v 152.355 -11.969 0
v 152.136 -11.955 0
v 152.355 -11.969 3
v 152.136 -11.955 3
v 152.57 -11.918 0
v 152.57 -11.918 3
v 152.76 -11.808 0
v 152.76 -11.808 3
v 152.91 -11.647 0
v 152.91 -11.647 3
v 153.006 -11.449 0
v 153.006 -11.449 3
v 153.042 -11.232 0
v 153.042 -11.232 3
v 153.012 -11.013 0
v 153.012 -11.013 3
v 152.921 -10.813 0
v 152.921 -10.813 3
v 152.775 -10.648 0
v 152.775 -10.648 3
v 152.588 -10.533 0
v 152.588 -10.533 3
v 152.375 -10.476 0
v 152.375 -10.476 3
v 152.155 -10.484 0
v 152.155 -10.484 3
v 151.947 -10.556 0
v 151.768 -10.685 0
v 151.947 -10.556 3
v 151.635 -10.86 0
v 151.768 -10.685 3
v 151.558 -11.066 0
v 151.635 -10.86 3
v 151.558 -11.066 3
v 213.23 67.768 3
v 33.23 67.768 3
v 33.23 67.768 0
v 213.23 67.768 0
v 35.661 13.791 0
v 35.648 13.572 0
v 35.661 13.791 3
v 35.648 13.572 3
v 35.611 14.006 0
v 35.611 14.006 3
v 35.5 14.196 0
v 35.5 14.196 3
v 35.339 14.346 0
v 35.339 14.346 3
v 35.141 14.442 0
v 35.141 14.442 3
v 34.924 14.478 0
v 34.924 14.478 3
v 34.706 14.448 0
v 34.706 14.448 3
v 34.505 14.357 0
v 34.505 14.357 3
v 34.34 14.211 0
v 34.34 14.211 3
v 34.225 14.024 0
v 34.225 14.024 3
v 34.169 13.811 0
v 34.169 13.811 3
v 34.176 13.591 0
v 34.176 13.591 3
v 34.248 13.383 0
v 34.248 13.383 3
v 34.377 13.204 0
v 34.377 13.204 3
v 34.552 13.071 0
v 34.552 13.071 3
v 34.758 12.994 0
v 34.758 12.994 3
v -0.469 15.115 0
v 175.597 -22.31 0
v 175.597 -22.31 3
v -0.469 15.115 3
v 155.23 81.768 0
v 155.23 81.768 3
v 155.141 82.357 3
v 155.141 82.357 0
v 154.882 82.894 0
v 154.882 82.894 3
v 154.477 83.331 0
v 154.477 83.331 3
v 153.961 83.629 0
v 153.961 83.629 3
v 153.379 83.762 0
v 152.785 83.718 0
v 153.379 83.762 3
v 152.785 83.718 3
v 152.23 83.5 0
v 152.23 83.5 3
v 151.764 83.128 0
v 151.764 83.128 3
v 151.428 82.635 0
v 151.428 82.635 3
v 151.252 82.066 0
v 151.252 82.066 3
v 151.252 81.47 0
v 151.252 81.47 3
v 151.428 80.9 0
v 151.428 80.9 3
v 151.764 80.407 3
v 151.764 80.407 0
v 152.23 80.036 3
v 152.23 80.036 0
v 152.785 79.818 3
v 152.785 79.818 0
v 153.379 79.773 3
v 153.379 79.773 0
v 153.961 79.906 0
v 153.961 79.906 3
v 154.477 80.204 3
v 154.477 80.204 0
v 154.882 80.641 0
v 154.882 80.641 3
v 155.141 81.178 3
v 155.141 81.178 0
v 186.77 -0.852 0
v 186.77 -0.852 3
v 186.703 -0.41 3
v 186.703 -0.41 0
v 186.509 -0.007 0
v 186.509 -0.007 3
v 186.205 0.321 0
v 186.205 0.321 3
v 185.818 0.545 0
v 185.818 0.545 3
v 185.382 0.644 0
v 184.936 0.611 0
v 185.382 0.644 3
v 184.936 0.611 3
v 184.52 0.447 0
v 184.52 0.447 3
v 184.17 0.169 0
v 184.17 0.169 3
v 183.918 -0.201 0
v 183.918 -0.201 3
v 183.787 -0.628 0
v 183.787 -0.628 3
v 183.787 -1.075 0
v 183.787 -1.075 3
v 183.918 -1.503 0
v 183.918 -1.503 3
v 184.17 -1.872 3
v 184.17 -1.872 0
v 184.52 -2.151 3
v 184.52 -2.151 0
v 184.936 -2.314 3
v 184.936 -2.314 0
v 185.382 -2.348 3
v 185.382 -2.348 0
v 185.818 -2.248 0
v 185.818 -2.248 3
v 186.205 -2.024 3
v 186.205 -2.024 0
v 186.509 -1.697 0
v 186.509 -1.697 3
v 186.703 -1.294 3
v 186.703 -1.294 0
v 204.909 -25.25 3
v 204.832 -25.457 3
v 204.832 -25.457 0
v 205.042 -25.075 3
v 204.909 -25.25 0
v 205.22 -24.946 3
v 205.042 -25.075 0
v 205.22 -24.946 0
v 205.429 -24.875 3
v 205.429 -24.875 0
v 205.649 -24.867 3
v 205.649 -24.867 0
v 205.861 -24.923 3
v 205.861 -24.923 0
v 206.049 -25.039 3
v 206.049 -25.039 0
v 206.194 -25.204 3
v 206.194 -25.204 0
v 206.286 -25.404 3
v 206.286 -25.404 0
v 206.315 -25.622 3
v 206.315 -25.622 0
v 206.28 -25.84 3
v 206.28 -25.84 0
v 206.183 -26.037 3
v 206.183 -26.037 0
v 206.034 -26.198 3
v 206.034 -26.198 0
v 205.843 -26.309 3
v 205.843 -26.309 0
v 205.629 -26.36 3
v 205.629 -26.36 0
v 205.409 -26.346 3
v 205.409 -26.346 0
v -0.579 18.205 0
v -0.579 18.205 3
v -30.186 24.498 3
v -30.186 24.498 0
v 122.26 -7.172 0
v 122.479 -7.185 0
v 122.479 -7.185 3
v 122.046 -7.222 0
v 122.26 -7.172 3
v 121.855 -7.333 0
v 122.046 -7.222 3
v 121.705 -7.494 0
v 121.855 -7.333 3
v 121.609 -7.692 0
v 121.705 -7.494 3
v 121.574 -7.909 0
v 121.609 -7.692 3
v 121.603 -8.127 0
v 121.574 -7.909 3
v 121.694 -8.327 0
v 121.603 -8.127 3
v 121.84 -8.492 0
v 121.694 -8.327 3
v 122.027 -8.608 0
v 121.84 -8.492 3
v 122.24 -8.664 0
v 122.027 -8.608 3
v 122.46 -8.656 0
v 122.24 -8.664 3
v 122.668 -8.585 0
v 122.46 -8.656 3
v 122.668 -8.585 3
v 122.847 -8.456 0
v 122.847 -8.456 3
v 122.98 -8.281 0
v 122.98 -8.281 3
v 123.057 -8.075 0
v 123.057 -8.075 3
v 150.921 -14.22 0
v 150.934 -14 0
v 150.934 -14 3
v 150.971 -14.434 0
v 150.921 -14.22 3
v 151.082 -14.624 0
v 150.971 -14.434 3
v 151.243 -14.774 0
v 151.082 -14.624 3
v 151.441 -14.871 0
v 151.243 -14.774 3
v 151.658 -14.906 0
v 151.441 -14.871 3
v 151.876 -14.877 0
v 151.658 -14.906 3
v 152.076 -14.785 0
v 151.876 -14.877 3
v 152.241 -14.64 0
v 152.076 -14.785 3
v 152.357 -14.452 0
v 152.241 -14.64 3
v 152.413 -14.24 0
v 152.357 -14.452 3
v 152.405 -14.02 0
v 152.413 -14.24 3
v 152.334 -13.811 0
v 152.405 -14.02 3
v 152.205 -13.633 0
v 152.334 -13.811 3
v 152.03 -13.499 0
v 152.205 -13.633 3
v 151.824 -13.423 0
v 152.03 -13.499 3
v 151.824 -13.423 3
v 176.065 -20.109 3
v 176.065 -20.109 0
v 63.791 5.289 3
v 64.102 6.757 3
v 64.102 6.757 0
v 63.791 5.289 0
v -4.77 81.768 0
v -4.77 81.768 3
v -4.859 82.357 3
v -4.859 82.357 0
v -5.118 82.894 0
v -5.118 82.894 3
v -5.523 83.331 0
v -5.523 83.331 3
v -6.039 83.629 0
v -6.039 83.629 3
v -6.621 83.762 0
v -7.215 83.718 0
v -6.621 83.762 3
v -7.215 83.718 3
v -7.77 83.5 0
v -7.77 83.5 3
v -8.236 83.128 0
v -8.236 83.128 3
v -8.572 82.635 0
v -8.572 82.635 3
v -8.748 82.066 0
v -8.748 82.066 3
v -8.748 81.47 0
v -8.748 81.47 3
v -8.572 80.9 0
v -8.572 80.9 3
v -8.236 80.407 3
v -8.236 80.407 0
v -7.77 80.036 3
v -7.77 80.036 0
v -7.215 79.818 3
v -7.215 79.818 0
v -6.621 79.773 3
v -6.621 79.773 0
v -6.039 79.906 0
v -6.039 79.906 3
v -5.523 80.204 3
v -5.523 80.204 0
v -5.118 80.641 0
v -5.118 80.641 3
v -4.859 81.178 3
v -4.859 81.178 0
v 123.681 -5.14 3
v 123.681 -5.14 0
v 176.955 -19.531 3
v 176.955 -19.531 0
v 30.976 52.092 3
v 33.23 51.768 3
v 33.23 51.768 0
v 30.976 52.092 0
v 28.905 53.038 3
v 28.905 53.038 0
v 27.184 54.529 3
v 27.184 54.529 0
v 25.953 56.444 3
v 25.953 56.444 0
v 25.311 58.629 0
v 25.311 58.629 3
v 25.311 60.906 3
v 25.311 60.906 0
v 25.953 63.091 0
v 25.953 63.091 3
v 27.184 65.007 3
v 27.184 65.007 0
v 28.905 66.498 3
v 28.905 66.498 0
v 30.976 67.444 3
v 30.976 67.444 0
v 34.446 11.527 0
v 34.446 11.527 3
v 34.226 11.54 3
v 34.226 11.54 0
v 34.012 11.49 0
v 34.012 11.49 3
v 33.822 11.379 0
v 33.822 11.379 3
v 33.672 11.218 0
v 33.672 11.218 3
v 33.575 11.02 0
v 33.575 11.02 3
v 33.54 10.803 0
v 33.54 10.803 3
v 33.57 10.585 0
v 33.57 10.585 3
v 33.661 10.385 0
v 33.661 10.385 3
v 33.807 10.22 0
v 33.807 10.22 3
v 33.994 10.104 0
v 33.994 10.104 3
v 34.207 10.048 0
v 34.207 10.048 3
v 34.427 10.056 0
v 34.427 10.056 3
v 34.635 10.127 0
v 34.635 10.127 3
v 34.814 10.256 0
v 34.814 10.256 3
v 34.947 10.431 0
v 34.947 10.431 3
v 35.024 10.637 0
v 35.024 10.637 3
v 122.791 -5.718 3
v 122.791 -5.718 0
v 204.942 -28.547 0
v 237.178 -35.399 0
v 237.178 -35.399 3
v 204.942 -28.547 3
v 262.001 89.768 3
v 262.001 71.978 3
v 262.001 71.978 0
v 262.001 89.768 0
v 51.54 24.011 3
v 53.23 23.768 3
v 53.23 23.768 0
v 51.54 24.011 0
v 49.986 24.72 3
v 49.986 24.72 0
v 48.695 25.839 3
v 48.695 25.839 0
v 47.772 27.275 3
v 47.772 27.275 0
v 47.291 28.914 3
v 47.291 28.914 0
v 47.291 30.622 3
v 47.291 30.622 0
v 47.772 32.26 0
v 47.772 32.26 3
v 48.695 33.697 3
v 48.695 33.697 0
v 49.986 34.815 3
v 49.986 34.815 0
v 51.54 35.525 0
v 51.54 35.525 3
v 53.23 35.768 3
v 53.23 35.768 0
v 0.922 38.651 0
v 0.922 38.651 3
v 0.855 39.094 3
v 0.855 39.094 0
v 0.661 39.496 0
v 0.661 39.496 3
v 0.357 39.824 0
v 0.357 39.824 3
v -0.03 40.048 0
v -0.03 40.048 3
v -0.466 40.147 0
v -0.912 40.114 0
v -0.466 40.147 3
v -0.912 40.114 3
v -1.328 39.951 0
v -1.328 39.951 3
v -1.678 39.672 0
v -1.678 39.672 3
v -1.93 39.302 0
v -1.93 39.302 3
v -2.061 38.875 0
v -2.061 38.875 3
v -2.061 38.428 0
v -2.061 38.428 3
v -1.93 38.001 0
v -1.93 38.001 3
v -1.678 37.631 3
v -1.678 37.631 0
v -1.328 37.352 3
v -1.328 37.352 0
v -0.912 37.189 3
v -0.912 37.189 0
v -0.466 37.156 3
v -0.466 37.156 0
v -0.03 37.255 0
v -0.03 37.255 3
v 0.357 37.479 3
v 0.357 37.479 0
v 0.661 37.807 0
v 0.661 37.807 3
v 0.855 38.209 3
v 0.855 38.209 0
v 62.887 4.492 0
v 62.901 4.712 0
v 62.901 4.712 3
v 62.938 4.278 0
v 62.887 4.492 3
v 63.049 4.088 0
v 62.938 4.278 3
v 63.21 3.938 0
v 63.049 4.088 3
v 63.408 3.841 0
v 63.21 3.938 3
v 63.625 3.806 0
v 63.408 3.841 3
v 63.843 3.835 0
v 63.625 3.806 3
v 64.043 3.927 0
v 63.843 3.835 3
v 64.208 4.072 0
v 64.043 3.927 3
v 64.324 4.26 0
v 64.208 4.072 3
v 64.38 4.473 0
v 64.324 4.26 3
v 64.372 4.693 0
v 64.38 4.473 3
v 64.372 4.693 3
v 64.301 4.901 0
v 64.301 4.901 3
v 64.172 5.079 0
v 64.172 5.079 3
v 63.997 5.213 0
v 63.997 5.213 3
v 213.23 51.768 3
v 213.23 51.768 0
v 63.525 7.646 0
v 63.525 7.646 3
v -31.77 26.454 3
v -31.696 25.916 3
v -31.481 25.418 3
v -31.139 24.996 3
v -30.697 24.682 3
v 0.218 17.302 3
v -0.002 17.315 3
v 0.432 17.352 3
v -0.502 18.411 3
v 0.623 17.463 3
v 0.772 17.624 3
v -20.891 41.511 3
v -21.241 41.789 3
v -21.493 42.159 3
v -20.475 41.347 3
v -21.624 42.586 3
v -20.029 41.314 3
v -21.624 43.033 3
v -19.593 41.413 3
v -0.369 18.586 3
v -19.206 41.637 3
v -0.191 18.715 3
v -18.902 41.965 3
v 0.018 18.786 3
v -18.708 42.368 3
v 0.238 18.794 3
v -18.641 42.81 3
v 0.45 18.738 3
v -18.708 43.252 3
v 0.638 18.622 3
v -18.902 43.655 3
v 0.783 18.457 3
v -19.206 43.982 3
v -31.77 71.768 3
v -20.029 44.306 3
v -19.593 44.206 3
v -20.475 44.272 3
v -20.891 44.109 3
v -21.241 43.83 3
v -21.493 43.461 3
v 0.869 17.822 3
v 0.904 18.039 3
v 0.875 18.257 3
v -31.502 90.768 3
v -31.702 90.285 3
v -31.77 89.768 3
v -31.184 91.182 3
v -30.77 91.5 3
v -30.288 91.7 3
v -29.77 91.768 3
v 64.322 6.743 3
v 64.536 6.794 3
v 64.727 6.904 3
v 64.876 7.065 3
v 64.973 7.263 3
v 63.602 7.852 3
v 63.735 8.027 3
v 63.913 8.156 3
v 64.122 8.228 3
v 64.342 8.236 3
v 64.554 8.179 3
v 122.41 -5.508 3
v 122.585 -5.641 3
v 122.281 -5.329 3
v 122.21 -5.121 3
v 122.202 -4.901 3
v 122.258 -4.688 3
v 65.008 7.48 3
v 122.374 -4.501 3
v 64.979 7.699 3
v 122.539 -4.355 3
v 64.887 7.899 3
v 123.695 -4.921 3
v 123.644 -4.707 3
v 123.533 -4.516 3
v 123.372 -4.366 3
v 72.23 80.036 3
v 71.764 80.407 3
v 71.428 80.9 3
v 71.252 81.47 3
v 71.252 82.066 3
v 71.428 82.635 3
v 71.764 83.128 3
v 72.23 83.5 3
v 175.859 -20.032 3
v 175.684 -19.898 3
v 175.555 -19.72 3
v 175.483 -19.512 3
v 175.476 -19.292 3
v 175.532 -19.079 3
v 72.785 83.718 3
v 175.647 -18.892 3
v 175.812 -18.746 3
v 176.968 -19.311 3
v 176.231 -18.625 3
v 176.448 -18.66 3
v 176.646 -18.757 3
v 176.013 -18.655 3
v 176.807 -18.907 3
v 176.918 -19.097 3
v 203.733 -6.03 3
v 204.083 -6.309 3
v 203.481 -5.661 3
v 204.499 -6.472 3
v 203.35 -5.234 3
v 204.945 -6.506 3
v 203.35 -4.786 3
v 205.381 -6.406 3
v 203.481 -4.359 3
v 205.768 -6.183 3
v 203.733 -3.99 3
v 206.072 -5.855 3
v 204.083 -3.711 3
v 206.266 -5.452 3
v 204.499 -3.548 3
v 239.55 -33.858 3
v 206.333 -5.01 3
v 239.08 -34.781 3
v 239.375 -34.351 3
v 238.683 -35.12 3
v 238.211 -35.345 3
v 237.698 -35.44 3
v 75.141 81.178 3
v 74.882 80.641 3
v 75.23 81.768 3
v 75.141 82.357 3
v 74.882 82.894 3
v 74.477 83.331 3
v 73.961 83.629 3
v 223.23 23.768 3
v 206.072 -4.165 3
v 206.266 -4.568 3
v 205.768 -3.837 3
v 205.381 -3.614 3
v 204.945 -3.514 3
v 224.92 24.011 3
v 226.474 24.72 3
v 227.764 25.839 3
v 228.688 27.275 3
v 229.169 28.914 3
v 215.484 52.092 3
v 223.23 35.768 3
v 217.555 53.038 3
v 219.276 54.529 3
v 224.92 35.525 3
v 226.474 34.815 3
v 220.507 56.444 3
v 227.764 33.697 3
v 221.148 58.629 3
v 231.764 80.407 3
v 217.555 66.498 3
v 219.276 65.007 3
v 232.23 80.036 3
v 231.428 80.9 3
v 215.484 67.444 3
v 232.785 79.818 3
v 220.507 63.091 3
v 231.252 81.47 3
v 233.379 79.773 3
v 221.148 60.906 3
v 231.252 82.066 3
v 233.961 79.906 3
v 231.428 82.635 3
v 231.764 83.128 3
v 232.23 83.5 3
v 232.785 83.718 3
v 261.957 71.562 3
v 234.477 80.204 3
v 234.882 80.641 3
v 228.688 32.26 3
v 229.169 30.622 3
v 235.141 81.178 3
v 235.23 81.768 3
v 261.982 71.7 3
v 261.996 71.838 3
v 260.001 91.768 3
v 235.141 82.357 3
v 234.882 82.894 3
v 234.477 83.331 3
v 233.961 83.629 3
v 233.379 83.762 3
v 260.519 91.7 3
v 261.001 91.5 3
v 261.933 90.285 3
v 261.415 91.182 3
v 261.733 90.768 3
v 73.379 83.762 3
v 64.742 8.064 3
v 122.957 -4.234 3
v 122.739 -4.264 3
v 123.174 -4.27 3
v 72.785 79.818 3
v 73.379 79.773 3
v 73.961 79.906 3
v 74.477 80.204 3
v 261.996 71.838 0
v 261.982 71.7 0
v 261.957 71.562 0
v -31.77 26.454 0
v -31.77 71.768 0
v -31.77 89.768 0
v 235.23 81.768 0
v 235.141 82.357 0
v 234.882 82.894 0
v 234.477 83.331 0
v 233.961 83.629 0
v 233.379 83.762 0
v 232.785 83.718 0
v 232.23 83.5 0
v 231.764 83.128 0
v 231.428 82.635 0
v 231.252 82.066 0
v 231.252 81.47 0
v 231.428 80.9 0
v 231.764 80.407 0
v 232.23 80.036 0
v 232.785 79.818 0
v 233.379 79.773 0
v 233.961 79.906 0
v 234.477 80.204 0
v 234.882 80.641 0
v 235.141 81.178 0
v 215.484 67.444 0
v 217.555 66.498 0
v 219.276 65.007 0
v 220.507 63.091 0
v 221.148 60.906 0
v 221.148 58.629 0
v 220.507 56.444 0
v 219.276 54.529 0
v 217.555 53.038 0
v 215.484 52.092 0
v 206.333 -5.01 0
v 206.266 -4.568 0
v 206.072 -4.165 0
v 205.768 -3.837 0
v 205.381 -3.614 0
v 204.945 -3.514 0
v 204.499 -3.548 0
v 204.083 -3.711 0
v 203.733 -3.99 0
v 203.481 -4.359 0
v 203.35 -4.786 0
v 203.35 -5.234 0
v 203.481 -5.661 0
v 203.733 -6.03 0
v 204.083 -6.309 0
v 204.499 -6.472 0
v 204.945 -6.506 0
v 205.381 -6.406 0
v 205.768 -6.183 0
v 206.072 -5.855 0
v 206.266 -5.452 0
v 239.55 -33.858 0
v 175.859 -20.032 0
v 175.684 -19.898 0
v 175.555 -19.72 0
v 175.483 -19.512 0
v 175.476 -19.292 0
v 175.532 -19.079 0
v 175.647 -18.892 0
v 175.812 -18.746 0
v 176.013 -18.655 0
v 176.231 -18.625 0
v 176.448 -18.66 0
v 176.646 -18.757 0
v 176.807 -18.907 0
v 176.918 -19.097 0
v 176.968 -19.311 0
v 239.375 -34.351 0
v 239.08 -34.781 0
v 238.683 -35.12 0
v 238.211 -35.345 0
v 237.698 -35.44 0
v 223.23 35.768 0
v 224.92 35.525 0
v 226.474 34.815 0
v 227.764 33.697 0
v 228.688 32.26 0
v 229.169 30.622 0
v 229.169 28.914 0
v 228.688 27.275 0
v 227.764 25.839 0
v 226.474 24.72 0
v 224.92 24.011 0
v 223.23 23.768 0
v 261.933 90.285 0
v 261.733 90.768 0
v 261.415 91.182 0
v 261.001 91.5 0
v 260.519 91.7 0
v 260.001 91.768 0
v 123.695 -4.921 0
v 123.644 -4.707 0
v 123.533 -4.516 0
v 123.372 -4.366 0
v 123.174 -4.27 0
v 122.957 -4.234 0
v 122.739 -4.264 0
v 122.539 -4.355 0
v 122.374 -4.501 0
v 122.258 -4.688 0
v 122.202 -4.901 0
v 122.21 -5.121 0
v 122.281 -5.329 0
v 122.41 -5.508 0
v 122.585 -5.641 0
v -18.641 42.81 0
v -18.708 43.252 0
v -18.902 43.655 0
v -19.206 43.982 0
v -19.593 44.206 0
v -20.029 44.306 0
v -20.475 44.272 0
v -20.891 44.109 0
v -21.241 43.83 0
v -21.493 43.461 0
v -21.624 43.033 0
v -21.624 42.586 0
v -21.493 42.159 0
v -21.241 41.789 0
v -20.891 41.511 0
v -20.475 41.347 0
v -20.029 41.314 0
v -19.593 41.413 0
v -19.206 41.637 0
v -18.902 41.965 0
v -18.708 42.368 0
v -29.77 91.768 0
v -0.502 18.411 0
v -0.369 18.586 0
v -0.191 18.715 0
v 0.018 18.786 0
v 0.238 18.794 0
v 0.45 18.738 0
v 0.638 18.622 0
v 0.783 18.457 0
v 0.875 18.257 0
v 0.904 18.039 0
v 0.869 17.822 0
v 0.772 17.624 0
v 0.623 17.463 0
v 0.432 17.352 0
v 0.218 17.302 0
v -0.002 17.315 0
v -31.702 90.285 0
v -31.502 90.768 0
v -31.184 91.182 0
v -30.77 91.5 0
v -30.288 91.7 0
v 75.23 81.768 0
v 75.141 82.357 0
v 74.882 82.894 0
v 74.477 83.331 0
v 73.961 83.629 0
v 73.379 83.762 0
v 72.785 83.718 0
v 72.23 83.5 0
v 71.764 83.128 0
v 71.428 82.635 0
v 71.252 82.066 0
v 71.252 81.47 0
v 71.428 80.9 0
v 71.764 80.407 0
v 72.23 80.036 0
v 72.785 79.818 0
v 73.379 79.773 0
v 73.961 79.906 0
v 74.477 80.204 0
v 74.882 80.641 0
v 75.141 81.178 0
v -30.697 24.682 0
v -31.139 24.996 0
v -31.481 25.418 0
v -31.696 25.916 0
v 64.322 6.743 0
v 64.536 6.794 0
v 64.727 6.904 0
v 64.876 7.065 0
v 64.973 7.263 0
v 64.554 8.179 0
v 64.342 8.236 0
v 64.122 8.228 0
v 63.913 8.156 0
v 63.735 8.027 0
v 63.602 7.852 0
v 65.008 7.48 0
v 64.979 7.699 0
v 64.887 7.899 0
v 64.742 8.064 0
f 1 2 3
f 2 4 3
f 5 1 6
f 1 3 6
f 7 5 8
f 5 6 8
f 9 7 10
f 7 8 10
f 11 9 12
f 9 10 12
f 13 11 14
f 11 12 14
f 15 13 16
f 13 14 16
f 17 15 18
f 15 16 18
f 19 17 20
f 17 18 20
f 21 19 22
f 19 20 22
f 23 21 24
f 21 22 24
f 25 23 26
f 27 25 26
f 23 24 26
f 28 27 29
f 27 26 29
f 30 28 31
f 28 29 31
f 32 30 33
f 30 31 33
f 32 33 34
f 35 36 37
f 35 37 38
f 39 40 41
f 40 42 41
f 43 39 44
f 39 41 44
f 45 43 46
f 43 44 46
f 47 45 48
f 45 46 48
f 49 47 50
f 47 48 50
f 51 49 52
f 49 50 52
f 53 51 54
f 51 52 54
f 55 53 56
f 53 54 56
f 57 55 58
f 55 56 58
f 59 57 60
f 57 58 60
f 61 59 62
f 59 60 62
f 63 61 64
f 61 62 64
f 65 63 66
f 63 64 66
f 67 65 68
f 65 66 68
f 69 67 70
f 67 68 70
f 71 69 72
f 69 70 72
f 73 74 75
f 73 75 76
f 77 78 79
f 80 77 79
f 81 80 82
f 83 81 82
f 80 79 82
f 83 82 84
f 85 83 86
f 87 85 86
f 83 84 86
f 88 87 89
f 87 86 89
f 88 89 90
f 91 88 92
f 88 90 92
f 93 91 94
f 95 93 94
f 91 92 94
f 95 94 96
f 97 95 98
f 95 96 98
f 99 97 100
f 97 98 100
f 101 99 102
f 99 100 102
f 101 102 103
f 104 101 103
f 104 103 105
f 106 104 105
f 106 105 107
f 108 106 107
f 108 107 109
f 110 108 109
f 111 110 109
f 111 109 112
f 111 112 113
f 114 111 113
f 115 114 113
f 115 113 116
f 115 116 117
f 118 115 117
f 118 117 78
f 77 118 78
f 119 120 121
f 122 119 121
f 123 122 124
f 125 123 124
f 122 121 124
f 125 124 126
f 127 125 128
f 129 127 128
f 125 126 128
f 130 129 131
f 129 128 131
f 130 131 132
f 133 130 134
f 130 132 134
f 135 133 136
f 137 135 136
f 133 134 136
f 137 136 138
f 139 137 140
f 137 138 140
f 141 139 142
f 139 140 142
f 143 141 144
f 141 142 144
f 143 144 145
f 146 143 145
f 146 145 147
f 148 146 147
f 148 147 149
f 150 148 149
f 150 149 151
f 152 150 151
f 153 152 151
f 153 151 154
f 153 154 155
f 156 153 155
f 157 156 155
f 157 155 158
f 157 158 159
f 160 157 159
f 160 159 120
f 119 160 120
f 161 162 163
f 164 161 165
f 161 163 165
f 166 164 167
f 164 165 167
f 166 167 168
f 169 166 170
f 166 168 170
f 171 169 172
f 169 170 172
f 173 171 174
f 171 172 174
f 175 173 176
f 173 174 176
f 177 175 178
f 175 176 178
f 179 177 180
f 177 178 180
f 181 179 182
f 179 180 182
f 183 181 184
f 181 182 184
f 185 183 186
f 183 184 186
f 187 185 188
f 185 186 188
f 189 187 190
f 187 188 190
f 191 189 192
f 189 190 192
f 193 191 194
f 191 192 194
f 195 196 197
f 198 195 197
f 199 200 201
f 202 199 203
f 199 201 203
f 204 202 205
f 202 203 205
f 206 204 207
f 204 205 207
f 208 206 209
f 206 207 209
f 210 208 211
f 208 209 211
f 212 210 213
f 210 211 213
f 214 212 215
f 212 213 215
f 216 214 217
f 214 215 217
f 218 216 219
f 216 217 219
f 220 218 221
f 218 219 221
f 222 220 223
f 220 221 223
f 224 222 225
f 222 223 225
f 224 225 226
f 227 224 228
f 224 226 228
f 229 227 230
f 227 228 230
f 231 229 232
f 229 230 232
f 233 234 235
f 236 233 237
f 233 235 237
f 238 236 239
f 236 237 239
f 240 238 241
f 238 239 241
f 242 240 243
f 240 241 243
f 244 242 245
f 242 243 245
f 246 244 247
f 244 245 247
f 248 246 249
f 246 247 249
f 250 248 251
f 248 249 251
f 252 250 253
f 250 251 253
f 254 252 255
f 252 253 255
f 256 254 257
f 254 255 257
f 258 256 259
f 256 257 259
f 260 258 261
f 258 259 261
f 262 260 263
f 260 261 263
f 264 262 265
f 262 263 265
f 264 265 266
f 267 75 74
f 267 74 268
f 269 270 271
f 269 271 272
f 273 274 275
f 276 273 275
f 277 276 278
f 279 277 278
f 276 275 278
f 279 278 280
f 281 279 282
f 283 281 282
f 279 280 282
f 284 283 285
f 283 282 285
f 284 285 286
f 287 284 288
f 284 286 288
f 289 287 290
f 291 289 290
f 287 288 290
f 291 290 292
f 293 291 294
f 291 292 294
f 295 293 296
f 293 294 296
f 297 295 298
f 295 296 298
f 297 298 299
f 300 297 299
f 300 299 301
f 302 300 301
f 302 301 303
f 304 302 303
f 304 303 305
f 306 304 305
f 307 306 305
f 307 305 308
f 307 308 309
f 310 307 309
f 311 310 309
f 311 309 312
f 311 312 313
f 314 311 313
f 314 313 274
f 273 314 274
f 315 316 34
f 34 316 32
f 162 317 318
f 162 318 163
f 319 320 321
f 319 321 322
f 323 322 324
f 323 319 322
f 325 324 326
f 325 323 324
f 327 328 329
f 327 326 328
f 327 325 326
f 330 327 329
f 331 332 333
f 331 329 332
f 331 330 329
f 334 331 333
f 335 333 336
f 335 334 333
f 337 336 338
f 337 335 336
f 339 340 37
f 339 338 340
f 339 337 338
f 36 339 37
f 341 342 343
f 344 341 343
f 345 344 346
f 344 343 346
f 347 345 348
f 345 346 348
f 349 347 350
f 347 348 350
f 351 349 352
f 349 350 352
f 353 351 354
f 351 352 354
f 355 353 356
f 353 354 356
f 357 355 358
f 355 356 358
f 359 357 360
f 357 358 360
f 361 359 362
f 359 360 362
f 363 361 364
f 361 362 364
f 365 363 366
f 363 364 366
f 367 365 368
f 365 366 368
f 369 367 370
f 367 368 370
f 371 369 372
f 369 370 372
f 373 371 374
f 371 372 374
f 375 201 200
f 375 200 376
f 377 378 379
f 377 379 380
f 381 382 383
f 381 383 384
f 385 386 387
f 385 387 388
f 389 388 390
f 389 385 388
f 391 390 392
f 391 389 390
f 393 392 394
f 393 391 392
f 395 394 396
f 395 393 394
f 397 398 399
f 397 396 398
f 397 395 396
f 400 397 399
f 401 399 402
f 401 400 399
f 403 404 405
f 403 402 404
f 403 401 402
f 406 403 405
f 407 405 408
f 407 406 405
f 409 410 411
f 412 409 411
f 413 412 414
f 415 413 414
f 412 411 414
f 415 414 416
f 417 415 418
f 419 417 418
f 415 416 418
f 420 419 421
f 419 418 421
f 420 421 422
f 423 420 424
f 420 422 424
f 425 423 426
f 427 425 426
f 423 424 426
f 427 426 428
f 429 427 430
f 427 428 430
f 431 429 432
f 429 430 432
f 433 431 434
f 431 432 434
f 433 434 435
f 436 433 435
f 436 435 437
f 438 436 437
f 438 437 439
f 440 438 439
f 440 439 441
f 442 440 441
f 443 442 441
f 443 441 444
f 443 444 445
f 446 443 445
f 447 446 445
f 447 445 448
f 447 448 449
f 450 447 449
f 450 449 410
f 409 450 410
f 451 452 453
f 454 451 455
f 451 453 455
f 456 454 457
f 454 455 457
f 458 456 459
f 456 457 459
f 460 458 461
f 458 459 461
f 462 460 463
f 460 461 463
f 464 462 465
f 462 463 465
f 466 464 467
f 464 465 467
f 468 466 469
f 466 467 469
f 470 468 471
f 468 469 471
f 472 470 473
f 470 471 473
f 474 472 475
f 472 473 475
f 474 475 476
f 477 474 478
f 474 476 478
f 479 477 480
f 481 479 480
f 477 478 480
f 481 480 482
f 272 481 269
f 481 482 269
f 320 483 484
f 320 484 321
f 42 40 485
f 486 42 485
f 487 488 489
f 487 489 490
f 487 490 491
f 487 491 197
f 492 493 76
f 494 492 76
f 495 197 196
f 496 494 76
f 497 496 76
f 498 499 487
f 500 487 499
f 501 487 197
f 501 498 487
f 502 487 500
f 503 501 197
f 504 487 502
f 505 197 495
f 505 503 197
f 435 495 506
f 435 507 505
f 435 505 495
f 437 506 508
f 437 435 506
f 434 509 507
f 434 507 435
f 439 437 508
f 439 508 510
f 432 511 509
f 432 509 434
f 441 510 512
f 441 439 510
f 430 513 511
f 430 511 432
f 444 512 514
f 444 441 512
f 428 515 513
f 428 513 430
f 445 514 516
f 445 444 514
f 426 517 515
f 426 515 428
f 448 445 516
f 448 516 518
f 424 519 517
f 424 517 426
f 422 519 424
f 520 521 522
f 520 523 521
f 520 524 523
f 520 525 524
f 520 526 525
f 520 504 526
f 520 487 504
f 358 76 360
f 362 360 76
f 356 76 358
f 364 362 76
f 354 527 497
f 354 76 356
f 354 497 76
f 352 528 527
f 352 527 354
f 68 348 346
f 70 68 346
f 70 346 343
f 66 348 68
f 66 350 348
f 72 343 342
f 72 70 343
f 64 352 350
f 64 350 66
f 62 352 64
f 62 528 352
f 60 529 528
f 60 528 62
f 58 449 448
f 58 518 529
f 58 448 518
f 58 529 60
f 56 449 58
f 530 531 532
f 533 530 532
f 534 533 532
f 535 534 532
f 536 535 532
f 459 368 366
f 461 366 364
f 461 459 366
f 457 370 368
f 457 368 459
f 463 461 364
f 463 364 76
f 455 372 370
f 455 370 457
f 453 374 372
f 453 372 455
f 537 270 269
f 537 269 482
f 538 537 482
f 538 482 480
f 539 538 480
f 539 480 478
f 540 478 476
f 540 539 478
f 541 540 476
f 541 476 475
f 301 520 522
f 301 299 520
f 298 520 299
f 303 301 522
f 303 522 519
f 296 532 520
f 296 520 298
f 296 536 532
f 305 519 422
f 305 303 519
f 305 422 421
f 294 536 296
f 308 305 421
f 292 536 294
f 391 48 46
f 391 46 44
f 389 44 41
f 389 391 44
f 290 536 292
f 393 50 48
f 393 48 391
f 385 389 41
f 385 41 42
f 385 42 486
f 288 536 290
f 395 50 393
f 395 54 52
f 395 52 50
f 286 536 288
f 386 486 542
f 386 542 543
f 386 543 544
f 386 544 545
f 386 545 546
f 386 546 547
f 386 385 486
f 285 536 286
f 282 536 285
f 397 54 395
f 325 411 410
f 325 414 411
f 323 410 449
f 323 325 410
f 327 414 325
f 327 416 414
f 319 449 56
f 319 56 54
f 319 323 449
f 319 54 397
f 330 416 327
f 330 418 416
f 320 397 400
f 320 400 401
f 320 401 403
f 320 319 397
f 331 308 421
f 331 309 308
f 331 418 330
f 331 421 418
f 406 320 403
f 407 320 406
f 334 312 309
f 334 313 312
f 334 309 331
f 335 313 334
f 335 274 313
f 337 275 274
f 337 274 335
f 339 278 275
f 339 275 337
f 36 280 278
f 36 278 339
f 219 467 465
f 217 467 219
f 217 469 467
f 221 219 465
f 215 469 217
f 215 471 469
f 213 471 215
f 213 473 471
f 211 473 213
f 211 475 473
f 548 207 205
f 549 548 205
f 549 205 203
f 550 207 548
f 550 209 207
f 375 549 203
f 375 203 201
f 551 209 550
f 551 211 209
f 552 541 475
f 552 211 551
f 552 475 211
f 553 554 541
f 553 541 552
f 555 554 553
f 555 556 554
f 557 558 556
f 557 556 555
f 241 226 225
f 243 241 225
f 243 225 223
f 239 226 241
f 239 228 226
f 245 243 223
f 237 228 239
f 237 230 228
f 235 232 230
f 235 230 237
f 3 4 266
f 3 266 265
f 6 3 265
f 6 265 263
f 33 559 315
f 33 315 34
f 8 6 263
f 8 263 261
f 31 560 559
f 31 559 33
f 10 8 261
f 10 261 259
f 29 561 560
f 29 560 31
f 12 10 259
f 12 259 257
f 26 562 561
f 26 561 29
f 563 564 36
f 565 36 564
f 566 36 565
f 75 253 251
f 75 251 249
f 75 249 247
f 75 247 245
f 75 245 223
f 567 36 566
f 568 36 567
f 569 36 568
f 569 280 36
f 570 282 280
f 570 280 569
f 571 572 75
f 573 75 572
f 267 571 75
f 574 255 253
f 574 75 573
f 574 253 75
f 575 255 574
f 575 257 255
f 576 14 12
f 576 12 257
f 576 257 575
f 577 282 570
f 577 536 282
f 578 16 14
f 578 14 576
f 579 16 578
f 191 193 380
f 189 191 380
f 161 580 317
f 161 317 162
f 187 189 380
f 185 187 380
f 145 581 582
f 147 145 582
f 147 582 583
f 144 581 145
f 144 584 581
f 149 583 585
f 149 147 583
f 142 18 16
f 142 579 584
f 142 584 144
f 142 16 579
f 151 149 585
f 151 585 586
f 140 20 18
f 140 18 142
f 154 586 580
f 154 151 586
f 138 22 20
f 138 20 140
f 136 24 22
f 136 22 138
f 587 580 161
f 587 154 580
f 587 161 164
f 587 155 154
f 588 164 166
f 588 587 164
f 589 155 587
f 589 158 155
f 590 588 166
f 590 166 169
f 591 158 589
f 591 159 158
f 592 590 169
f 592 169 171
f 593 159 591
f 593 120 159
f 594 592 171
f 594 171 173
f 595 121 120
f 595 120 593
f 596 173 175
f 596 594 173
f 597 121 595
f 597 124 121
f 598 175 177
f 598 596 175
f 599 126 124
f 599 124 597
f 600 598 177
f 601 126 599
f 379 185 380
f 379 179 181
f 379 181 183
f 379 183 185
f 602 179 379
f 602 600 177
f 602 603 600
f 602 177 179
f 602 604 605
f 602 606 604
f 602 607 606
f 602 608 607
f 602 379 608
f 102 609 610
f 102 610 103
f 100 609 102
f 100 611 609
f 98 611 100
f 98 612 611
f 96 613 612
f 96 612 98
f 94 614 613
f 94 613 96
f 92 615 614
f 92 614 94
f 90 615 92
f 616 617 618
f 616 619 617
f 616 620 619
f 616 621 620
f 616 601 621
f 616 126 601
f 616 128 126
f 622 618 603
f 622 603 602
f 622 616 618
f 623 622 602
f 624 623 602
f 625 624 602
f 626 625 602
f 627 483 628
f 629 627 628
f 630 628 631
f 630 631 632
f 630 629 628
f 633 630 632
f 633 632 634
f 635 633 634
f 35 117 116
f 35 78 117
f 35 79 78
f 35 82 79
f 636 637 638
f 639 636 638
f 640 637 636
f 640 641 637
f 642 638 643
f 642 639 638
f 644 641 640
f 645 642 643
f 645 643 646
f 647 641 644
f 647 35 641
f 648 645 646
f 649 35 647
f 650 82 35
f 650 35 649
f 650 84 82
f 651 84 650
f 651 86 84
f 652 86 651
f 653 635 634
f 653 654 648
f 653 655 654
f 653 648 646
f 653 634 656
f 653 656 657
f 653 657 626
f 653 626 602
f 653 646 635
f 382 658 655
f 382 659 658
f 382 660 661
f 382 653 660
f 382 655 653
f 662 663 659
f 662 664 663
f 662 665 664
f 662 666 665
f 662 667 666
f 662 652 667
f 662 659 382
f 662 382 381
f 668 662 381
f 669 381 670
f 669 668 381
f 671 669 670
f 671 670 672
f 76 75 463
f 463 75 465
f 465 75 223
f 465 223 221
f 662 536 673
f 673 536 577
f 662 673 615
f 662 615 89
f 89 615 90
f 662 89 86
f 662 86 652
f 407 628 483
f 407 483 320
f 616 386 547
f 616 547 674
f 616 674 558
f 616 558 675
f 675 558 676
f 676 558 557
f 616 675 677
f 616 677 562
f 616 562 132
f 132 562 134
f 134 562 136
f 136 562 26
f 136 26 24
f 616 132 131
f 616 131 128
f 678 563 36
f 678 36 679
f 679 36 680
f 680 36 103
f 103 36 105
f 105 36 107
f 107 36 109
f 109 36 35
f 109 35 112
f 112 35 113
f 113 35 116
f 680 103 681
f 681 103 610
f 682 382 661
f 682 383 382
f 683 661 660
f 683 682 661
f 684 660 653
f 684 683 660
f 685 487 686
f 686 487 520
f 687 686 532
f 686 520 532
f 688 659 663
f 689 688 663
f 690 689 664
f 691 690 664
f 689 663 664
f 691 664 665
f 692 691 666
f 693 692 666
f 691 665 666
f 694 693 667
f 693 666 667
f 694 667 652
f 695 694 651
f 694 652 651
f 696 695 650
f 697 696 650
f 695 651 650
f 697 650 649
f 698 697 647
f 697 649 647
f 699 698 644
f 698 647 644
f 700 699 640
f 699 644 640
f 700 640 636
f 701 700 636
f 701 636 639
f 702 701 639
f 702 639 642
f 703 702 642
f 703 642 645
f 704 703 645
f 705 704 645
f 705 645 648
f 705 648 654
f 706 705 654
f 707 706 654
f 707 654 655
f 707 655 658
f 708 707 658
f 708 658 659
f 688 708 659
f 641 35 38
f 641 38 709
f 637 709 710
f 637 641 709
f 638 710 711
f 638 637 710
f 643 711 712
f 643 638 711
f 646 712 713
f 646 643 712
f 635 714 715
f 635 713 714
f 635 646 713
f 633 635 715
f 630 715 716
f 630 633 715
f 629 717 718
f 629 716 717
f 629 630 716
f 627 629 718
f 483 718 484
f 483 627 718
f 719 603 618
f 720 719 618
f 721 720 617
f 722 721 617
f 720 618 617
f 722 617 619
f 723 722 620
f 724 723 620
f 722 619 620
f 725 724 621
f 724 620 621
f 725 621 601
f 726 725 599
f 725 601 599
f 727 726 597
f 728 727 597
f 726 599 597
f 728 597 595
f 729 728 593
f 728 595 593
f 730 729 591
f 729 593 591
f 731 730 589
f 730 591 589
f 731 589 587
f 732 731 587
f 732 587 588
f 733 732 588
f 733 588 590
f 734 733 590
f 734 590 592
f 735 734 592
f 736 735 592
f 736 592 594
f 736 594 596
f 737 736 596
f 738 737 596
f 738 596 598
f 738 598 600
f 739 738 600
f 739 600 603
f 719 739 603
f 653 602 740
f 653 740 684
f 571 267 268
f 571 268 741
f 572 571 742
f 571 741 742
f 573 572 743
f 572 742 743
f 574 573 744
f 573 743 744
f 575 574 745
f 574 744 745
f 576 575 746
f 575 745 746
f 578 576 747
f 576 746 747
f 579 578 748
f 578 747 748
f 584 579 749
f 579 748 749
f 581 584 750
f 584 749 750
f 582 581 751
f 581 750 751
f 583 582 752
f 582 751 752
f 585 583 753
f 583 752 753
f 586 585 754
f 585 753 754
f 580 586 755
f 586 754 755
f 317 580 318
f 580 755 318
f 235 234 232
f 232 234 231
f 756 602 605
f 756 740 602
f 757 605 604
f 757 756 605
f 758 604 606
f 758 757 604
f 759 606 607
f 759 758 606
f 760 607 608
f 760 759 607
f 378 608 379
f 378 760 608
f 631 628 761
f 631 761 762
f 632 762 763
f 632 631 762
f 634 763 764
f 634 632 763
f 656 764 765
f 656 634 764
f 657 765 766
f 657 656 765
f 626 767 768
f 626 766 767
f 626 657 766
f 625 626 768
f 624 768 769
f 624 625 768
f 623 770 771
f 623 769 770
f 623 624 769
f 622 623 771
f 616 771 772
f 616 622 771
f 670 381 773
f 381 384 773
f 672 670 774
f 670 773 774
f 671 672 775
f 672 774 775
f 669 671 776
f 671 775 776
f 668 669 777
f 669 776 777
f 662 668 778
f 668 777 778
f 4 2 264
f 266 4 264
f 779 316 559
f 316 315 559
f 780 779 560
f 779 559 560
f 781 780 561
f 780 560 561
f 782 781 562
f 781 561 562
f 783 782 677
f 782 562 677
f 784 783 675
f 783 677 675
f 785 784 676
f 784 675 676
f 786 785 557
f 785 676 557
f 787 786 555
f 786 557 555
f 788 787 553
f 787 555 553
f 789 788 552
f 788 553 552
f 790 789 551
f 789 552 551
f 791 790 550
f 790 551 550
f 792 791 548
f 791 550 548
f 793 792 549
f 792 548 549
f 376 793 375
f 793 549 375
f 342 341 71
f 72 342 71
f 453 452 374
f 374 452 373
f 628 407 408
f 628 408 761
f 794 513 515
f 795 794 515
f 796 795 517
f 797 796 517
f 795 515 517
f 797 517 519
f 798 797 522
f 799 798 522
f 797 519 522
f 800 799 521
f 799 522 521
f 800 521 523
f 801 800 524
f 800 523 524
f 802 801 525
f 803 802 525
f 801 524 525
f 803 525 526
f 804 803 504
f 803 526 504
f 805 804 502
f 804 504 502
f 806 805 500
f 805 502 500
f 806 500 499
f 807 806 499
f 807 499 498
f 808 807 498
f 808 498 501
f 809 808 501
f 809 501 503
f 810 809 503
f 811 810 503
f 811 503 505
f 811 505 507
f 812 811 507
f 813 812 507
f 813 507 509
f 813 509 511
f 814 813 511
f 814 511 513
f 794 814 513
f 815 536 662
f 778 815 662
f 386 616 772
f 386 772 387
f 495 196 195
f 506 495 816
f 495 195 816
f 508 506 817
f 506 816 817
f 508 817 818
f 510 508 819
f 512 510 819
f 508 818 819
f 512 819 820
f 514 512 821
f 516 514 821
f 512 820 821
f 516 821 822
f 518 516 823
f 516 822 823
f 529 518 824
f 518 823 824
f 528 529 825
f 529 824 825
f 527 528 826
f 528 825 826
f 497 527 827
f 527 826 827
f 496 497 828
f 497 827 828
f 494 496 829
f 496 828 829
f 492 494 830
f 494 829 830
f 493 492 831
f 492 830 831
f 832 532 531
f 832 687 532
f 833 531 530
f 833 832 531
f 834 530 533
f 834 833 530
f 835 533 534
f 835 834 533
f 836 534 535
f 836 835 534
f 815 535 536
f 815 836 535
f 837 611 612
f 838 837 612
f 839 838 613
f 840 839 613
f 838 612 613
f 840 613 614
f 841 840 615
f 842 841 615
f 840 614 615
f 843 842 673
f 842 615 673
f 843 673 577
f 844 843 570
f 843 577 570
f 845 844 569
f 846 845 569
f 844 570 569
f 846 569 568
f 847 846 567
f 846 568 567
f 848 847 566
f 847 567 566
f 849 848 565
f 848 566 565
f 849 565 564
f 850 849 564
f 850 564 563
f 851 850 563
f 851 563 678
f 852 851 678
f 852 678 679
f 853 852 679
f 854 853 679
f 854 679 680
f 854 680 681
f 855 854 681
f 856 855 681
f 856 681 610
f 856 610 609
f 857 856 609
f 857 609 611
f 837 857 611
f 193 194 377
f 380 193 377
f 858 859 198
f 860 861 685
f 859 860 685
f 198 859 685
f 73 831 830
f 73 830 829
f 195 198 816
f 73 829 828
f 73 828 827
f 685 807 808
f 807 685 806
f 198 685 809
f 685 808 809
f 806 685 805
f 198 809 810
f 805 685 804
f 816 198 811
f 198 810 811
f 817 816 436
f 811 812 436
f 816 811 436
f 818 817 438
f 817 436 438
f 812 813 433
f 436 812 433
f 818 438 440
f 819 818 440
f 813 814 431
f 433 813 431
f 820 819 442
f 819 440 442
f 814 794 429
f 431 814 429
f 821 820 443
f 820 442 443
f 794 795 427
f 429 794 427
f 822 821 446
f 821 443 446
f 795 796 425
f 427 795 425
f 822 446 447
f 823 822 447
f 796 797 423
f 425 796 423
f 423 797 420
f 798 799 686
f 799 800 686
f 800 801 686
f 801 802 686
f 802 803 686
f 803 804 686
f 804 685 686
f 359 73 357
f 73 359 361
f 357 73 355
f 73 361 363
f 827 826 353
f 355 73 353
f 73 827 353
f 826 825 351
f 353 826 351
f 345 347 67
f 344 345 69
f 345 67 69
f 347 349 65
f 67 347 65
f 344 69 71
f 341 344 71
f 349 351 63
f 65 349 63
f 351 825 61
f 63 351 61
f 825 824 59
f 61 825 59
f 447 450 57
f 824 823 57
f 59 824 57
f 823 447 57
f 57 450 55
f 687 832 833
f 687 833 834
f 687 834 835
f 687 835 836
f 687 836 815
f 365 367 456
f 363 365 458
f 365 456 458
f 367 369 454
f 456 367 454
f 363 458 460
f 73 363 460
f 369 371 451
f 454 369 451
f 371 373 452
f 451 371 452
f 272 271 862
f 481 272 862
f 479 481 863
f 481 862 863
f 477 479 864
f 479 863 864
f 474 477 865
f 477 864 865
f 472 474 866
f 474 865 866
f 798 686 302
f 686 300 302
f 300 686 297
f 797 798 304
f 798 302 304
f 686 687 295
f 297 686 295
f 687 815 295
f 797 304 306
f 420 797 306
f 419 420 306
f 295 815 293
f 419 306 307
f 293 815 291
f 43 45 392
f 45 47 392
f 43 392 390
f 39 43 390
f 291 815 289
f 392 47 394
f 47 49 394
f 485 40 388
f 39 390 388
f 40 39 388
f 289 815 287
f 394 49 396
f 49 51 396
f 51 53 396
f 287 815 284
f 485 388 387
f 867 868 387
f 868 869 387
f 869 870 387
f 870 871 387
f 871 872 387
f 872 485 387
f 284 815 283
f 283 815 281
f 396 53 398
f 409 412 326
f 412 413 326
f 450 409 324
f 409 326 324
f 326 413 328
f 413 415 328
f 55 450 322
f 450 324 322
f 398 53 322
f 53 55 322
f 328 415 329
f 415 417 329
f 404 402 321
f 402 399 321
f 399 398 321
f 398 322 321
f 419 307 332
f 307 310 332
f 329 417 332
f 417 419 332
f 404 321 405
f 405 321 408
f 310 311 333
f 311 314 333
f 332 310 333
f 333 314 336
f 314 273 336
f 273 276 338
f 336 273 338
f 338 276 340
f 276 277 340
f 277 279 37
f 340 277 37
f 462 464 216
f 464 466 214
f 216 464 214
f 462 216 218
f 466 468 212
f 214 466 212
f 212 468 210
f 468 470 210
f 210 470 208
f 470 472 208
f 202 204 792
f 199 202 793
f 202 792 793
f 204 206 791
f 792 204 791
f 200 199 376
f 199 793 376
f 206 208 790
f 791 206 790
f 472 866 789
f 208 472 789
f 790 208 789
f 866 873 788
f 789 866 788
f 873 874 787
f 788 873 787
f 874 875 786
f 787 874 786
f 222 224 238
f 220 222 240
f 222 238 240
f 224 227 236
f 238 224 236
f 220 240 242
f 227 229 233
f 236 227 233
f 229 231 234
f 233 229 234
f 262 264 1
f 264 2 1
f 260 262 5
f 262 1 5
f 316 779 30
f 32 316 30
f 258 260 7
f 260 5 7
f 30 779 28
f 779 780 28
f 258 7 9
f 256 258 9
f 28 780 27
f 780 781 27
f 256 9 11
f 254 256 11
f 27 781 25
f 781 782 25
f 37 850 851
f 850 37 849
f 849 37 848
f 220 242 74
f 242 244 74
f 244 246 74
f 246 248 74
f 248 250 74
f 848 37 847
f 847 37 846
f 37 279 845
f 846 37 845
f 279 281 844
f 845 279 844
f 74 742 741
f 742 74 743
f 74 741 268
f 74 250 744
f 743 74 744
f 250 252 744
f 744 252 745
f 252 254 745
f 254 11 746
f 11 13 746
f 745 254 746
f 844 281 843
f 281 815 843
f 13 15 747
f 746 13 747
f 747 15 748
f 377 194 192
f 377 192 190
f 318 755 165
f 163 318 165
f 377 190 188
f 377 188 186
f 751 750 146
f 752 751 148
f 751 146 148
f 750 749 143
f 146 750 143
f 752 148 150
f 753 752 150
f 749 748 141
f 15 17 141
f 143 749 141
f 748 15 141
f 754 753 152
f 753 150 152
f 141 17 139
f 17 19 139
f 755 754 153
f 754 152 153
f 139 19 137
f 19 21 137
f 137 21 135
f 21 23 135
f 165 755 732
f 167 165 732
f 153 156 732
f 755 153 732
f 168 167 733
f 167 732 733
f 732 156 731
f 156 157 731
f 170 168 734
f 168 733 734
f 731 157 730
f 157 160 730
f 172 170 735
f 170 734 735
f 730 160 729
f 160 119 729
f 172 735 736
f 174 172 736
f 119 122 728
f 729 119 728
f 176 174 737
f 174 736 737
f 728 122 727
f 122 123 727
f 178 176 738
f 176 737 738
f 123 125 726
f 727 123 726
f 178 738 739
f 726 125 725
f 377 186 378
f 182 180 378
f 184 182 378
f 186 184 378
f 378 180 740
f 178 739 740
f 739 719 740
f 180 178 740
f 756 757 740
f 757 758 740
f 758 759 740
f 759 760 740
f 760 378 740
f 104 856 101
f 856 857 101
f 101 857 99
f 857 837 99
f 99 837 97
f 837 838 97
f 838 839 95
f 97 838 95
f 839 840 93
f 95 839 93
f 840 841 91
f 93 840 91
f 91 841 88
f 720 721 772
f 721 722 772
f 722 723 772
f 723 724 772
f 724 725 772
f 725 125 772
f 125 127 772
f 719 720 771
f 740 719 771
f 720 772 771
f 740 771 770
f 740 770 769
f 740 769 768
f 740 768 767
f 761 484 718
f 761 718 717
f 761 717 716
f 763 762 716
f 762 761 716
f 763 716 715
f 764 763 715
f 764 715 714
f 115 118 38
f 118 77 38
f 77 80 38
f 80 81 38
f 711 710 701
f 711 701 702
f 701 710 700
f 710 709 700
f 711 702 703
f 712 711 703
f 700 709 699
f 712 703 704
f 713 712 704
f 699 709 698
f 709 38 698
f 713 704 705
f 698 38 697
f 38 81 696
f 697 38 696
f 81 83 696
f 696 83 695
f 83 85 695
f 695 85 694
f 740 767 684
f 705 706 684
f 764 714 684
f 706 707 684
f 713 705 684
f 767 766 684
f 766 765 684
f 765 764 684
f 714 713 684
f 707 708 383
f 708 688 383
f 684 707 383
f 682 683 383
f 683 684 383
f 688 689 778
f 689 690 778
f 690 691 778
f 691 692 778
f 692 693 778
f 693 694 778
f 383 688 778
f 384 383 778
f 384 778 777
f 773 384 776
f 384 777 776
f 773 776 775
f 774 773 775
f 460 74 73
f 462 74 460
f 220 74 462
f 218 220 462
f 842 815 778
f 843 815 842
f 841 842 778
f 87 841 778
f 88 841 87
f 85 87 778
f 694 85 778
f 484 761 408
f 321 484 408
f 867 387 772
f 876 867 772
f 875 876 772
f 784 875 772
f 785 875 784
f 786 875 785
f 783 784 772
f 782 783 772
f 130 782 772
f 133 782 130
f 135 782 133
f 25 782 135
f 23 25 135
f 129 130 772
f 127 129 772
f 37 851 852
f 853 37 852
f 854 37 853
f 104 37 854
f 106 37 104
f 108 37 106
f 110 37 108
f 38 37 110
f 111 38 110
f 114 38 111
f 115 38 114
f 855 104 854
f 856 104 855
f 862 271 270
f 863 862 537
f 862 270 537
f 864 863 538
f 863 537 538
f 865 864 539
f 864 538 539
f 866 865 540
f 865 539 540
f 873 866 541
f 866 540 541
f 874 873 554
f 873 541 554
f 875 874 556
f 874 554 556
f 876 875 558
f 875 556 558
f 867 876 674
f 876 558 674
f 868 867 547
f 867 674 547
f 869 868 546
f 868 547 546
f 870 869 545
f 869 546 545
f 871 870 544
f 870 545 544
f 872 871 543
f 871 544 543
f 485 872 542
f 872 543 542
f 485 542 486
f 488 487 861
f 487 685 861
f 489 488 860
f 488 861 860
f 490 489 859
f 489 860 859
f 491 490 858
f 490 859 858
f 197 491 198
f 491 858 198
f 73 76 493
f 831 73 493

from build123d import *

# Parameters (mm, degrees)
EXTRUDE_1_DEPTH      = 3
CUT_EXTRUDE_2_DEPTH  = 10
SKETCH_4_R           = 1.5
CUT_EXTRUDE_3_DEPTH  = 10
CUT_EXTRUDE_6_DEPTH  = 327.235911434
SKETCH_12_W          = 293.771267283
SKETCH_12_H          = 20
EXTRUDE_2_DEPTH      = 3
SKETCH_13_R          = 2
CUT_EXTRUDE_9_DEPTH  = 278.623703749
CUT_EXTRUDE_10_DEPTH = 10
MM_2_D               = 1.5
CUT_EXTRUDE_11_DEPTH = 278.623703749
MM_3_D               = 1.5
FILLET_1_R           = 2


with BuildPart() as part:
    # 草图1 → 凸台-拉伸1 (new body)
    with BuildSketch(Plane.XY):
        Polygon((-31.770103996, 71.767703031), (318.229896004, 71.767703031), (292.931935015, -47.249845949), (-31.770103996, 21.767703031), align=None)
    extrude(amount=EXTRUDE_1_DEPTH)

    # 草图3 → 切除-拉伸2 (cut)
    with BuildSketch(Plane.XY.offset(3)):
        Polygon((-0.469380772, 15.114528924), (0.1543543, 18.048971727), (-31.770103996, 24.834724815), (-31.770103996, 21.767703031), align=None)
        Polygon((176.220922432, -19.375132621), (205.565350454, -25.612483345), (204.941615382, -28.546926147), (175.59718736, -22.309575423), align=None)
    extrude(amount=-CUT_EXTRUDE_2_DEPTH, mode=Mode.SUBTRACT)

    # 草图4 → 切除-拉伸3 (cut)
    with BuildSketch(Plane.XY.offset(3)):
        with Locations((-20.141101902, 42.809716012)):
            Circle(SKETCH_4_R)
        with Locations((-0.578149887, 38.651482195)):
            Circle(SKETCH_4_R)
        with Locations((185.269894252, -0.85173906)):
            Circle(SKETCH_4_R)
        with Locations((204.832846267, -5.009972876)):
            Circle(SKETCH_4_R)
    extrude(amount=-CUT_EXTRUDE_3_DEPTH, mode=Mode.SUBTRACT)

    # 草图7 → 切除-拉伸6 (cut, through all)
    with BuildSketch(Plane.XY.offset(3)):
        Polygon((292.931935015, -47.249845949), (239.133816975, -35.814702954), (262.001163287, 71.767703031), (318.229896004, 71.767703031), align=None)
    extrude(amount=-CUT_EXTRUDE_6_DEPTH, mode=Mode.SUBTRACT)

    # 草图12 → 凸台-拉伸2 (add)
    with BuildSketch(Plane.XY.offset(3)):
        with Locations((115.115529646, 81.767703031)):
            Rectangle(SKETCH_12_W, SKETCH_12_H)
    extrude(amount=-EXTRUDE_2_DEPTH)

    # 草图13 → 切除-拉伸9 (cut, through all)
    with BuildSketch(Plane.XY.offset(3)):
        with Locations((-6.770103996, 81.767703031)):
            Circle(SKETCH_13_R)
        with Locations((73.229896004, 81.767703031)):
            Circle(SKETCH_13_R)
        with Locations((153.229896004, 81.767703031)):
            Circle(SKETCH_13_R)
        with Locations((233.229896004, 81.767703031)):
            Circle(SKETCH_13_R)
    extrude(amount=-CUT_EXTRUDE_9_DEPTH, mode=Mode.SUBTRACT)

    # 草图14 → 切除-拉伸10 (cut)
    with BuildSketch(Plane.XY.offset(3)):
        with BuildLine():
            Line((33.229896004, 67.767703031), (213.229896004, 67.767703031))
            ThreePointArc((213.229896004, 67.767703031), (221.229896004, 59.767703031), (213.229896004, 51.767703031))
            Line((213.229896004, 51.767703031), (33.229896004, 51.767703031))
            ThreePointArc((33.229896004, 51.767703031), (25.229896004, 59.767703031), (33.229896004, 67.767703031))
        make_face()
        with BuildLine():
            Line((53.229896004, 35.767703031), (223.229896004, 35.767703031))
            ThreePointArc((223.229896004, 35.767703031), (229.229896004, 29.767703031), (223.229896004, 23.767703031))
            Line((223.229896004, 23.767703031), (53.229896004, 23.767703031))
            ThreePointArc((53.229896004, 23.767703031), (47.229896004, 29.767703031), (53.229896004, 35.767703031))
        make_face()
    extrude(amount=-CUT_EXTRUDE_10_DEPTH, mode=Mode.SUBTRACT)

    # 大小mm 暗销槽口2 (through all)
    with Locations(Plane.XY.offset(3)):
        with Locations((0.1543543, 18.048971727), (176.220922432, -19.375132621), (205.565350454, -25.612483345)):
            Hole(MM_2_D / 2)

    # 草图18 → 切除-拉伸11 (cut, through all)
    with BuildSketch(Plane(origin=(0, 0, 0), x_dir=(-1, 0, 0), z_dir=(0, 0, -1))):
        Polygon((-152.291642964, -11.221785469), (-151.667907892, -14.156228271), (-122.32347987, -7.918877547), (-122.947214942, -4.984434744), align=None)
        Polygon((-64.258358898, 7.490266705), (-63.634623826, 4.555823902), (-34.290195804, 10.793174627), (-34.913930876, 13.727617429), align=None)
    extrude(amount=-CUT_EXTRUDE_11_DEPTH, mode=Mode.SUBTRACT)

    # 大小mm 暗销槽口3 (through all)
    with Locations(Plane(origin=(0, 0, 0), x_dir=(-1, 0, 0), z_dir=(0, 0, -1))):
        with Locations((-152.291642964, -11.221785469), (-151.667907892, -14.156228271), (-122.32347987, -7.918877547), (-122.947214942, -4.984434744), (-64.258358898, 7.490266705), (-63.634623826, 4.555823902), (-34.290195804, 10.793174627), (-34.913930876, 13.727617429)):
            Hole(MM_3_D / 2)

    # 圆角1
    fillet_1_edges = [part.edges().sort_by_distance(p)[0] for p in [
        (-31.770103996, 24.834724815, 1.5),
        (239.133816975, -35.814702954, 1.5),
        (262.001163287, 71.767703031, 1.5),
        (-31.770103996, 91.767703031, 1.5),
        (262.001163287, 91.767703031, 1.5),
    ]]
    fillet(fillet_1_edges, radius=FILLET_1_R)


solid = part.part
